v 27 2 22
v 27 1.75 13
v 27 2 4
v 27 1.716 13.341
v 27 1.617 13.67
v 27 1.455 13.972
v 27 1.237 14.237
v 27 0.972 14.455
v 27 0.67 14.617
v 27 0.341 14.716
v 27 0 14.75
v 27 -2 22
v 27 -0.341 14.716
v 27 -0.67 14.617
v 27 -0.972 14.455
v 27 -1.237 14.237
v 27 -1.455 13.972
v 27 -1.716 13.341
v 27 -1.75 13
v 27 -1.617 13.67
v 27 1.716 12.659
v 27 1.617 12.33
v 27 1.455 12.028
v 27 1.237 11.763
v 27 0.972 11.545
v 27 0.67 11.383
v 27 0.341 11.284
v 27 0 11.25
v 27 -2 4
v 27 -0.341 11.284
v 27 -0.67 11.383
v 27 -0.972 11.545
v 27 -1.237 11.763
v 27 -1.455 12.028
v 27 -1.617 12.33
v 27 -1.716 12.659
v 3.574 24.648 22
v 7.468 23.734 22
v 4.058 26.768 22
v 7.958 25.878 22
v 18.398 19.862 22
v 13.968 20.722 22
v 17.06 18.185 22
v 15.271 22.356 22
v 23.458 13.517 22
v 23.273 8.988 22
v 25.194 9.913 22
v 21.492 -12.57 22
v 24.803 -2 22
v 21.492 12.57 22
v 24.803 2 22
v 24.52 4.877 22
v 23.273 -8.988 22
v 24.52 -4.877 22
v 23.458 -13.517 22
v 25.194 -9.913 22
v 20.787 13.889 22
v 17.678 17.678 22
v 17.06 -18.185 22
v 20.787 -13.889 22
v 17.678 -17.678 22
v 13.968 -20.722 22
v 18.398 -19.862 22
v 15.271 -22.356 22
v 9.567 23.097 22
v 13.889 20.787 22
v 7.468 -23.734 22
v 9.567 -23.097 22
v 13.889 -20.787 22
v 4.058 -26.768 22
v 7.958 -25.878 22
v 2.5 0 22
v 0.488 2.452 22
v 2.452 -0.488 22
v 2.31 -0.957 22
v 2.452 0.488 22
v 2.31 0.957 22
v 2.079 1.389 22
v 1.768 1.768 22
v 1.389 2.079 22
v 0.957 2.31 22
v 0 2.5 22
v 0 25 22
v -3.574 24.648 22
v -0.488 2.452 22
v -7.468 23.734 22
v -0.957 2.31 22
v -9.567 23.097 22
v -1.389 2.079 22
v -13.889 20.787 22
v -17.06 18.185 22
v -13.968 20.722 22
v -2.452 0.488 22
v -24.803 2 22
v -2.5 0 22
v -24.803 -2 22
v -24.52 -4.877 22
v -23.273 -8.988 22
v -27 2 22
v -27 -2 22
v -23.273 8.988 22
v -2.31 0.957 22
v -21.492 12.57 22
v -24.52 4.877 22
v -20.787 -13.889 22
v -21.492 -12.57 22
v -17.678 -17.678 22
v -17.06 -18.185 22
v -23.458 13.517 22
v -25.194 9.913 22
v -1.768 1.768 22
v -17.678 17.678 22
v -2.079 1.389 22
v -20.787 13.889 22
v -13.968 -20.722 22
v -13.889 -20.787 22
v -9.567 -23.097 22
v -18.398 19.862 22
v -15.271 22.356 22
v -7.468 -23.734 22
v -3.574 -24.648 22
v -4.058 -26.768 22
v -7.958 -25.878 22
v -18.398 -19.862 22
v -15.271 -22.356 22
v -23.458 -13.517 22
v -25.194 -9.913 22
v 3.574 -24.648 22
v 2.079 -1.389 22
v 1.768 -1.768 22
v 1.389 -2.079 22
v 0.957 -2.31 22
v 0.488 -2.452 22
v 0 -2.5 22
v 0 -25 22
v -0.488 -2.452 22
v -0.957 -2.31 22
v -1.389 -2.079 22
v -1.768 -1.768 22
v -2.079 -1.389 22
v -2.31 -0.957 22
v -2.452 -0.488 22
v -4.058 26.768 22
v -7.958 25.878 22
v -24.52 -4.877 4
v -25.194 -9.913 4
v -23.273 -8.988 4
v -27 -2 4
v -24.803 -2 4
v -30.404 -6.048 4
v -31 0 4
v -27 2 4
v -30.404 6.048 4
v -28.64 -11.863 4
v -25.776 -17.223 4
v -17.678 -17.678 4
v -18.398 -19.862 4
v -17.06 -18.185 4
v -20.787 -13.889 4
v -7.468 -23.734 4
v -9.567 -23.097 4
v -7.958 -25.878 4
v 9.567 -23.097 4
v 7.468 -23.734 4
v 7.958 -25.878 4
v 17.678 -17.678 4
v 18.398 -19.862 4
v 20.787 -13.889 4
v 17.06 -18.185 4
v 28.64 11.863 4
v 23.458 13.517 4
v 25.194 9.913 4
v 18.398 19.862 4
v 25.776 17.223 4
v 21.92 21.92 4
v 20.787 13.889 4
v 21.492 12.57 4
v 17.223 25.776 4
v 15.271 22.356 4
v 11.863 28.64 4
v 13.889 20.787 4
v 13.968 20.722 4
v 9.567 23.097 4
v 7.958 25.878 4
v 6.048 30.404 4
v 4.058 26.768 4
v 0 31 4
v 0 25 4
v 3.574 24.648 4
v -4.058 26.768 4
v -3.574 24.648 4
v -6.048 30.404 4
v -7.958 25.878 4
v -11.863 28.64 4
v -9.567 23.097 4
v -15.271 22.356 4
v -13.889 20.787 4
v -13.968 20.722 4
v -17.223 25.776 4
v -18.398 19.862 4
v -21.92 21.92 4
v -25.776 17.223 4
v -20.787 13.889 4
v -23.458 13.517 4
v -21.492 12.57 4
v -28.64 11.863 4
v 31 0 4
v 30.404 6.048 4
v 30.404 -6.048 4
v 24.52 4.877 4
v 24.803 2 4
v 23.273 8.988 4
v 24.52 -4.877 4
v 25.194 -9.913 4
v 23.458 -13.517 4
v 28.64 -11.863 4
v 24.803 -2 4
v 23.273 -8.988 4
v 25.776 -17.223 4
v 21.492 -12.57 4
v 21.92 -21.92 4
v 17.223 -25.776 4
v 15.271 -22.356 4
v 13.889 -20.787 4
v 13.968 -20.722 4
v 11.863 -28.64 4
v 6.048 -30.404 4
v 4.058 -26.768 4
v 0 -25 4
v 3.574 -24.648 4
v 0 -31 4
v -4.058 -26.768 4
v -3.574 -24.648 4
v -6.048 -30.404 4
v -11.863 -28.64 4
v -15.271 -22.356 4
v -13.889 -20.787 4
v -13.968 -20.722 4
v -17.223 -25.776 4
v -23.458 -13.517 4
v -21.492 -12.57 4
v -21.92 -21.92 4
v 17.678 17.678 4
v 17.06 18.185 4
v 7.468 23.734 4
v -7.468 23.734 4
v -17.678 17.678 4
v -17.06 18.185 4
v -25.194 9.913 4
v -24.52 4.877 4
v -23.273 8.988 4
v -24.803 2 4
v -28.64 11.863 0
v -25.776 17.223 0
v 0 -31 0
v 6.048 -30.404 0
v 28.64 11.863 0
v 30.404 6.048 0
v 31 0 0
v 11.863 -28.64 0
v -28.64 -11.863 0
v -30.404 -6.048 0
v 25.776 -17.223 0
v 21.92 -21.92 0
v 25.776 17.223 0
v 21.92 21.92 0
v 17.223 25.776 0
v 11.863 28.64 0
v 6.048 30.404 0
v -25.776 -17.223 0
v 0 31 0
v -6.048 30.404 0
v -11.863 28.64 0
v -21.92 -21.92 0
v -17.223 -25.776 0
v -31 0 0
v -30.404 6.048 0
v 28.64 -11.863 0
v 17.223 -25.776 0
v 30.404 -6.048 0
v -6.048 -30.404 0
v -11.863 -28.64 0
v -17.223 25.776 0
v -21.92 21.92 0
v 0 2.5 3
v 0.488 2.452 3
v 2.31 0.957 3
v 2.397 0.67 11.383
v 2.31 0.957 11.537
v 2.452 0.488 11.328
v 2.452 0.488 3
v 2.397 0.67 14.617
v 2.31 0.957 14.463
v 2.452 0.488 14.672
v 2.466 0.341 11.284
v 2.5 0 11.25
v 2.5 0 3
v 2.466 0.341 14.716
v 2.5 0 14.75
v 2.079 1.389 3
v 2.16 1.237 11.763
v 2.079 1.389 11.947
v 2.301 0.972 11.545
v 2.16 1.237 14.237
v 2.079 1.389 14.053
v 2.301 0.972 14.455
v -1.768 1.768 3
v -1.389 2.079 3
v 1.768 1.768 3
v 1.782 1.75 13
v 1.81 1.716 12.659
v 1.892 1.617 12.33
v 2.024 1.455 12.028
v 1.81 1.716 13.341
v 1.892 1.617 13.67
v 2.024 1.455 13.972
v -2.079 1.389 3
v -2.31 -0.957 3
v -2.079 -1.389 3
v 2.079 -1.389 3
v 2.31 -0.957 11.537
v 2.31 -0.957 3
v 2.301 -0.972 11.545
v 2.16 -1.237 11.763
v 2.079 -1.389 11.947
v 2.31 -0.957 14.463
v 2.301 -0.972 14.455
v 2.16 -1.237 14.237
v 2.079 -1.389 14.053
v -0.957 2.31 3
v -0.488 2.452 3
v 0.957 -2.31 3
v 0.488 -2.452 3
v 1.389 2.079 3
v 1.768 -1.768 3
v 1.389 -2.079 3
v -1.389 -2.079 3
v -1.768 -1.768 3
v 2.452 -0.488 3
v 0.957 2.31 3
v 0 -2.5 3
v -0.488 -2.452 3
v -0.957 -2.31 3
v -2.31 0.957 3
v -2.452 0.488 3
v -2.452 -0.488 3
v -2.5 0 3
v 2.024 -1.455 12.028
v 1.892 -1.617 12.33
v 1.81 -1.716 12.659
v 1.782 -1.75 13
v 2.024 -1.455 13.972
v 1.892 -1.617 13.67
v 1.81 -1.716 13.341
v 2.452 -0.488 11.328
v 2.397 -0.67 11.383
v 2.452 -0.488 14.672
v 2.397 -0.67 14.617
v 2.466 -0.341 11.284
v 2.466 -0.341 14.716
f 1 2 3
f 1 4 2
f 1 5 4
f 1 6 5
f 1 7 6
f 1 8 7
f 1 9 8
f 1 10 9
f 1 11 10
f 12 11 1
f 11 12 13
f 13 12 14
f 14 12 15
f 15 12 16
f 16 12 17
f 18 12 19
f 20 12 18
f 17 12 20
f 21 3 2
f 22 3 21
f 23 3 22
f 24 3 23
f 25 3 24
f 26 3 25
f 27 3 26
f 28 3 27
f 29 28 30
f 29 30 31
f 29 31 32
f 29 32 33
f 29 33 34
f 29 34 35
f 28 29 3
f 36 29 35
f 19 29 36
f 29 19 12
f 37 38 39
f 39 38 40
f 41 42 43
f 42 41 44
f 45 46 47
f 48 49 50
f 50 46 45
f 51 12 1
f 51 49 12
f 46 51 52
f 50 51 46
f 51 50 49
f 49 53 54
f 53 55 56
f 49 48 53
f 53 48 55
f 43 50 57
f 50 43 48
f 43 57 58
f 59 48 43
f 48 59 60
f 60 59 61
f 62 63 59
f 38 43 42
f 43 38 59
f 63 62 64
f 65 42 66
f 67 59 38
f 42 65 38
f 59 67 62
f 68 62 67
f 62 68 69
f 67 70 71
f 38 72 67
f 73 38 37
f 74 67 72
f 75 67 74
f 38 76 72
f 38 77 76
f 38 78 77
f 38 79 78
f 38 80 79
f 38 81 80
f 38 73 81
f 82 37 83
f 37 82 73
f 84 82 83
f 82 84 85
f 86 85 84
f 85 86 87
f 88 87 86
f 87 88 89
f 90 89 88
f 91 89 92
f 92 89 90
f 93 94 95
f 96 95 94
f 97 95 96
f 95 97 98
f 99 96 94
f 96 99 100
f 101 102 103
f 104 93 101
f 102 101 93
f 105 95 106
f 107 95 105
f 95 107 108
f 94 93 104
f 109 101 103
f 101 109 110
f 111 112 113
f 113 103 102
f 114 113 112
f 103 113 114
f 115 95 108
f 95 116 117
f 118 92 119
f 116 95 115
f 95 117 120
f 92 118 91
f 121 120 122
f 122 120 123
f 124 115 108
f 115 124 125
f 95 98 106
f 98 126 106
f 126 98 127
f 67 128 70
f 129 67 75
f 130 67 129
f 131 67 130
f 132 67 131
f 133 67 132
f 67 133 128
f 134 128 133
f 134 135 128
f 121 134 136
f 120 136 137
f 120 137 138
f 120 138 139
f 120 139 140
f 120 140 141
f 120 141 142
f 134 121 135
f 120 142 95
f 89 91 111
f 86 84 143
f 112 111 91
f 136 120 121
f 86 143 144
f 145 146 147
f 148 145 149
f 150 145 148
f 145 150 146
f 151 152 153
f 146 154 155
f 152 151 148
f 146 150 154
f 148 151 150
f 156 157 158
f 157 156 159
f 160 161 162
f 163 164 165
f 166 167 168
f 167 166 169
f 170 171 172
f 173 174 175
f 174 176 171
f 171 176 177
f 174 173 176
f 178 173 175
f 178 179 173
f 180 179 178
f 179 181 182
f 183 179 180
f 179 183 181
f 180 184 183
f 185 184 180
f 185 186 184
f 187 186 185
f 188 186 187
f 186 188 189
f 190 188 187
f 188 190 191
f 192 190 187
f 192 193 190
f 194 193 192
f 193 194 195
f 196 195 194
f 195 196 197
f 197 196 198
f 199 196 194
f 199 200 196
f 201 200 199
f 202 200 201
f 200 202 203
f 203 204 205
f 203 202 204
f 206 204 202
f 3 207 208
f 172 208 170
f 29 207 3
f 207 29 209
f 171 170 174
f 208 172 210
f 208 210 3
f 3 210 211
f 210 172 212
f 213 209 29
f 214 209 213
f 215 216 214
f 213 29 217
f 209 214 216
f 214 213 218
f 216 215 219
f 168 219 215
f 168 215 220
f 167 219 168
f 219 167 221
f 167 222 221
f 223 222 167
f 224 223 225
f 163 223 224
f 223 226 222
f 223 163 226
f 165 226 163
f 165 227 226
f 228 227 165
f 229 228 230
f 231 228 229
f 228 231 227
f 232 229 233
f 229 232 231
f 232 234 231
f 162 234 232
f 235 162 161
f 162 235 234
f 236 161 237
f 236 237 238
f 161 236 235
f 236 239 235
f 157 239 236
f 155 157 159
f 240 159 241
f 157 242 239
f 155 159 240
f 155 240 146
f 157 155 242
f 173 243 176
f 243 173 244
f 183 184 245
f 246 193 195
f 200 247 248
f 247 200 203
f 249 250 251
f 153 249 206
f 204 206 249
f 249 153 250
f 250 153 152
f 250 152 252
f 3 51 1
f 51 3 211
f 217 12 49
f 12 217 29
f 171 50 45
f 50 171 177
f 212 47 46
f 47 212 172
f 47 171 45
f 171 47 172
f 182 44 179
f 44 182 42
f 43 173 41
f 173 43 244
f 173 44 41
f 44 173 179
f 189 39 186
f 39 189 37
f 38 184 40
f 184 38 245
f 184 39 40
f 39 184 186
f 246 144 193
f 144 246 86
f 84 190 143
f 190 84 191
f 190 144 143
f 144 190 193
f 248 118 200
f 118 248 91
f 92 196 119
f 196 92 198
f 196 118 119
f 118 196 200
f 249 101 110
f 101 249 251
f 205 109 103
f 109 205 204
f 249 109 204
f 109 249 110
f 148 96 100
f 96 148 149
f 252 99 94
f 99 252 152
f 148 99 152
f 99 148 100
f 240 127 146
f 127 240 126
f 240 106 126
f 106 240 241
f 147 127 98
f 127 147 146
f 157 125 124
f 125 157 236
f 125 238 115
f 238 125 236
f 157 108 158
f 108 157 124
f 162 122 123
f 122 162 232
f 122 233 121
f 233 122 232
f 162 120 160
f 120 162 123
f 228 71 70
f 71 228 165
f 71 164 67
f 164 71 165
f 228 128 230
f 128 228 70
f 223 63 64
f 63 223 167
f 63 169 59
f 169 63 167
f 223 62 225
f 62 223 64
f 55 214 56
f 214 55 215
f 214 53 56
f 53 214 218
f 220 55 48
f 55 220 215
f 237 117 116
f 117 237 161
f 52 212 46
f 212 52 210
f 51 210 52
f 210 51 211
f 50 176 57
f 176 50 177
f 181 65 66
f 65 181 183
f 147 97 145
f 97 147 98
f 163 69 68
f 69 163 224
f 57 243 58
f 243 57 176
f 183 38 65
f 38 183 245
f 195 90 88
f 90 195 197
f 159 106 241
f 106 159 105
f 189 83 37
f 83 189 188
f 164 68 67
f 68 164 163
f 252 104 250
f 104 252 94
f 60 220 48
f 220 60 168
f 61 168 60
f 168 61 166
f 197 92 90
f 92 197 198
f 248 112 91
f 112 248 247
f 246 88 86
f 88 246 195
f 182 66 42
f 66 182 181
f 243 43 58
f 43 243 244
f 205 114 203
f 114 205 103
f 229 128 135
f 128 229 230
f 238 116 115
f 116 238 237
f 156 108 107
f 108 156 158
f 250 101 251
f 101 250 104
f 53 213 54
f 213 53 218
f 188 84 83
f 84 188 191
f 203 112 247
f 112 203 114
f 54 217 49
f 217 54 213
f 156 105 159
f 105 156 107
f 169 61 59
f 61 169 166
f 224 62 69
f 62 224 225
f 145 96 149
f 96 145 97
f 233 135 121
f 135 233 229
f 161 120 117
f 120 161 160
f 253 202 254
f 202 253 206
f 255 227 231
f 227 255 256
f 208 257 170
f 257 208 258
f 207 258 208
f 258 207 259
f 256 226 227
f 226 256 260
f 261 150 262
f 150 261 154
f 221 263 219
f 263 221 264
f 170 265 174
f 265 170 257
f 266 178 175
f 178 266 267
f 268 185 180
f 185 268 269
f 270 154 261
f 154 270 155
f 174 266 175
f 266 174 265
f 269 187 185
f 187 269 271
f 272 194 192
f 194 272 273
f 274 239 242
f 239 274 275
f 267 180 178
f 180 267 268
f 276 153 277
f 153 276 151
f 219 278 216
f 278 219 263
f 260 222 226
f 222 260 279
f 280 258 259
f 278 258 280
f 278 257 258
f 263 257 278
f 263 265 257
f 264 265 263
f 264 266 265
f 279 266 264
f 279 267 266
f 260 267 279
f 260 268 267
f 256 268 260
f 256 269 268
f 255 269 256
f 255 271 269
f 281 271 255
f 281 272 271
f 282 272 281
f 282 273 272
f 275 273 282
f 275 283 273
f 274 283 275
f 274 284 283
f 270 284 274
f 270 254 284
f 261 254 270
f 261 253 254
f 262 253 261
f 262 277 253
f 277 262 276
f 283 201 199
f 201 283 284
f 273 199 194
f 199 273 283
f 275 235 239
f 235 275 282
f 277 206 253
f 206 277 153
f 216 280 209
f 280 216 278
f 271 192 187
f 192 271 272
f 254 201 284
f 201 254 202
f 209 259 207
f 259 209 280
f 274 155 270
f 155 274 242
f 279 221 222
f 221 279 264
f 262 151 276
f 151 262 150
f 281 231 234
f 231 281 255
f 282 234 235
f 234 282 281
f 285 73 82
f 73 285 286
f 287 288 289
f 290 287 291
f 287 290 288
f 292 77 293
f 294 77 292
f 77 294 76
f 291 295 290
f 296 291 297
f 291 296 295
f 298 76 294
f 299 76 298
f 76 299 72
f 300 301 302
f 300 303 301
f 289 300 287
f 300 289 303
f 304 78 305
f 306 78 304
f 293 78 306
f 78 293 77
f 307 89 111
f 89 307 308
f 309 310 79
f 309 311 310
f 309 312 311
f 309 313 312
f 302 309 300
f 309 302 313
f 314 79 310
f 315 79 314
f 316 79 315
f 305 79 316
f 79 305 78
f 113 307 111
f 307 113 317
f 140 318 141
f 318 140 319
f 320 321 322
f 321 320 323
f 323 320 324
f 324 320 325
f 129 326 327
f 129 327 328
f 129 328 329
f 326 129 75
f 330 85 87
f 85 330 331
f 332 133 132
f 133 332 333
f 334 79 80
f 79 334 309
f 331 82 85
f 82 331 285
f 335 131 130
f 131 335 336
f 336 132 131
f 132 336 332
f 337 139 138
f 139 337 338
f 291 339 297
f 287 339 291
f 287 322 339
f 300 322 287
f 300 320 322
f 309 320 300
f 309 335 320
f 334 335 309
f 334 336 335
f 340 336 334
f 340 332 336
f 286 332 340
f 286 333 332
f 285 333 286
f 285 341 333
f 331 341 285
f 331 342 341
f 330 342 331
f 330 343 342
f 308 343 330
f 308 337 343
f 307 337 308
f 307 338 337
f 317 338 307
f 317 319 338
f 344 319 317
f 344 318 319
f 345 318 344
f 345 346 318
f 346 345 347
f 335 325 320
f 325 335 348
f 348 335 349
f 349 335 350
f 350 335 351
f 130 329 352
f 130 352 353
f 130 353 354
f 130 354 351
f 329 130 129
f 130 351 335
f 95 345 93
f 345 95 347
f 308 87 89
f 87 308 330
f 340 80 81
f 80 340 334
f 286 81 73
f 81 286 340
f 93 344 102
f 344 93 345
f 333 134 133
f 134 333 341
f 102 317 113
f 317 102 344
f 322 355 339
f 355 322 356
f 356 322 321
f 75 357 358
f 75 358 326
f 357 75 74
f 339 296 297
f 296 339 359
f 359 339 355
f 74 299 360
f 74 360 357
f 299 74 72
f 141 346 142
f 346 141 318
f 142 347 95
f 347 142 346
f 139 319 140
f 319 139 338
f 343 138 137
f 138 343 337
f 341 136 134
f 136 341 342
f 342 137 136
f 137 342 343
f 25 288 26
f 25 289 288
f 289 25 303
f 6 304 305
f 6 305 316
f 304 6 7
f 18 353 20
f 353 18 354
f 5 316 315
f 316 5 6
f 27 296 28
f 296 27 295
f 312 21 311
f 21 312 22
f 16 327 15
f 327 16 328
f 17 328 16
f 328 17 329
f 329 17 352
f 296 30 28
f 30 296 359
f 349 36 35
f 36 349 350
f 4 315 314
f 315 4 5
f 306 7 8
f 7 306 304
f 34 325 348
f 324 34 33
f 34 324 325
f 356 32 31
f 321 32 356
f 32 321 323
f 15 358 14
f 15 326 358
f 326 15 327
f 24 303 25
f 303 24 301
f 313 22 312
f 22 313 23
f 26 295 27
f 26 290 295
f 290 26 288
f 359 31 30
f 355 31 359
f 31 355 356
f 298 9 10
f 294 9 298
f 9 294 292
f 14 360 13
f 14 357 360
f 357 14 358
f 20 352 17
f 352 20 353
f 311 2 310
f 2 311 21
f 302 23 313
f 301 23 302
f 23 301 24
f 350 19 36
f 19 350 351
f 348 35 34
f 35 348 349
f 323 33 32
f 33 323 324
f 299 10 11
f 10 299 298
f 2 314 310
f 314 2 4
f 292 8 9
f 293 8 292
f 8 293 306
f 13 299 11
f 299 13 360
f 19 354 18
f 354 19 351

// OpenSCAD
$fn = 32;

// ----------------------------------------------------------------------
// Control knob: skirt knob with grip ribs
// ----------------------------------------------------------------------

// --- parameters (mm) ---
skirt_d = 62;             // skirt diameter
skirt_t = 4;              // skirt thickness
rib_w = 4;                // grip rib width
rib_out = 3;              // grip rib radial protrusion
n_ribs = 14;              // number of grip ribs
knob_d = 50;              // knob body diameter
knob_h = 18;              // knob body height
bore_d = 5;               // shaft bore diameter
set_d = 3.5;              // set screw bore diameter

rib_step = 360 / n_ribs;  // rib angular step
total_h = skirt_t + knob_h;  // overall height

difference() {
  union() {
    translate([0, 0, skirt_t]) cylinder(h = knob_h, d = knob_d);
    cylinder(h = skirt_t, d = skirt_d);
    for (i = [0 : n_ribs - 1])
      rotate([0, 0, i * rib_step])
        translate([knob_d / 2 - 1, -rib_w / 2, skirt_t])
          cube([rib_out, rib_w, knob_h]);
  }
  translate([0, 0, skirt_t - 1]) cylinder(h = knob_h + 2, d = bore_d);
  translate([-1, 0, skirt_t + knob_h / 2]) rotate([0, 90, 0])
    cylinder(h = knob_d / 2 + bore_d / 2 + 2, d = set_d);
}
